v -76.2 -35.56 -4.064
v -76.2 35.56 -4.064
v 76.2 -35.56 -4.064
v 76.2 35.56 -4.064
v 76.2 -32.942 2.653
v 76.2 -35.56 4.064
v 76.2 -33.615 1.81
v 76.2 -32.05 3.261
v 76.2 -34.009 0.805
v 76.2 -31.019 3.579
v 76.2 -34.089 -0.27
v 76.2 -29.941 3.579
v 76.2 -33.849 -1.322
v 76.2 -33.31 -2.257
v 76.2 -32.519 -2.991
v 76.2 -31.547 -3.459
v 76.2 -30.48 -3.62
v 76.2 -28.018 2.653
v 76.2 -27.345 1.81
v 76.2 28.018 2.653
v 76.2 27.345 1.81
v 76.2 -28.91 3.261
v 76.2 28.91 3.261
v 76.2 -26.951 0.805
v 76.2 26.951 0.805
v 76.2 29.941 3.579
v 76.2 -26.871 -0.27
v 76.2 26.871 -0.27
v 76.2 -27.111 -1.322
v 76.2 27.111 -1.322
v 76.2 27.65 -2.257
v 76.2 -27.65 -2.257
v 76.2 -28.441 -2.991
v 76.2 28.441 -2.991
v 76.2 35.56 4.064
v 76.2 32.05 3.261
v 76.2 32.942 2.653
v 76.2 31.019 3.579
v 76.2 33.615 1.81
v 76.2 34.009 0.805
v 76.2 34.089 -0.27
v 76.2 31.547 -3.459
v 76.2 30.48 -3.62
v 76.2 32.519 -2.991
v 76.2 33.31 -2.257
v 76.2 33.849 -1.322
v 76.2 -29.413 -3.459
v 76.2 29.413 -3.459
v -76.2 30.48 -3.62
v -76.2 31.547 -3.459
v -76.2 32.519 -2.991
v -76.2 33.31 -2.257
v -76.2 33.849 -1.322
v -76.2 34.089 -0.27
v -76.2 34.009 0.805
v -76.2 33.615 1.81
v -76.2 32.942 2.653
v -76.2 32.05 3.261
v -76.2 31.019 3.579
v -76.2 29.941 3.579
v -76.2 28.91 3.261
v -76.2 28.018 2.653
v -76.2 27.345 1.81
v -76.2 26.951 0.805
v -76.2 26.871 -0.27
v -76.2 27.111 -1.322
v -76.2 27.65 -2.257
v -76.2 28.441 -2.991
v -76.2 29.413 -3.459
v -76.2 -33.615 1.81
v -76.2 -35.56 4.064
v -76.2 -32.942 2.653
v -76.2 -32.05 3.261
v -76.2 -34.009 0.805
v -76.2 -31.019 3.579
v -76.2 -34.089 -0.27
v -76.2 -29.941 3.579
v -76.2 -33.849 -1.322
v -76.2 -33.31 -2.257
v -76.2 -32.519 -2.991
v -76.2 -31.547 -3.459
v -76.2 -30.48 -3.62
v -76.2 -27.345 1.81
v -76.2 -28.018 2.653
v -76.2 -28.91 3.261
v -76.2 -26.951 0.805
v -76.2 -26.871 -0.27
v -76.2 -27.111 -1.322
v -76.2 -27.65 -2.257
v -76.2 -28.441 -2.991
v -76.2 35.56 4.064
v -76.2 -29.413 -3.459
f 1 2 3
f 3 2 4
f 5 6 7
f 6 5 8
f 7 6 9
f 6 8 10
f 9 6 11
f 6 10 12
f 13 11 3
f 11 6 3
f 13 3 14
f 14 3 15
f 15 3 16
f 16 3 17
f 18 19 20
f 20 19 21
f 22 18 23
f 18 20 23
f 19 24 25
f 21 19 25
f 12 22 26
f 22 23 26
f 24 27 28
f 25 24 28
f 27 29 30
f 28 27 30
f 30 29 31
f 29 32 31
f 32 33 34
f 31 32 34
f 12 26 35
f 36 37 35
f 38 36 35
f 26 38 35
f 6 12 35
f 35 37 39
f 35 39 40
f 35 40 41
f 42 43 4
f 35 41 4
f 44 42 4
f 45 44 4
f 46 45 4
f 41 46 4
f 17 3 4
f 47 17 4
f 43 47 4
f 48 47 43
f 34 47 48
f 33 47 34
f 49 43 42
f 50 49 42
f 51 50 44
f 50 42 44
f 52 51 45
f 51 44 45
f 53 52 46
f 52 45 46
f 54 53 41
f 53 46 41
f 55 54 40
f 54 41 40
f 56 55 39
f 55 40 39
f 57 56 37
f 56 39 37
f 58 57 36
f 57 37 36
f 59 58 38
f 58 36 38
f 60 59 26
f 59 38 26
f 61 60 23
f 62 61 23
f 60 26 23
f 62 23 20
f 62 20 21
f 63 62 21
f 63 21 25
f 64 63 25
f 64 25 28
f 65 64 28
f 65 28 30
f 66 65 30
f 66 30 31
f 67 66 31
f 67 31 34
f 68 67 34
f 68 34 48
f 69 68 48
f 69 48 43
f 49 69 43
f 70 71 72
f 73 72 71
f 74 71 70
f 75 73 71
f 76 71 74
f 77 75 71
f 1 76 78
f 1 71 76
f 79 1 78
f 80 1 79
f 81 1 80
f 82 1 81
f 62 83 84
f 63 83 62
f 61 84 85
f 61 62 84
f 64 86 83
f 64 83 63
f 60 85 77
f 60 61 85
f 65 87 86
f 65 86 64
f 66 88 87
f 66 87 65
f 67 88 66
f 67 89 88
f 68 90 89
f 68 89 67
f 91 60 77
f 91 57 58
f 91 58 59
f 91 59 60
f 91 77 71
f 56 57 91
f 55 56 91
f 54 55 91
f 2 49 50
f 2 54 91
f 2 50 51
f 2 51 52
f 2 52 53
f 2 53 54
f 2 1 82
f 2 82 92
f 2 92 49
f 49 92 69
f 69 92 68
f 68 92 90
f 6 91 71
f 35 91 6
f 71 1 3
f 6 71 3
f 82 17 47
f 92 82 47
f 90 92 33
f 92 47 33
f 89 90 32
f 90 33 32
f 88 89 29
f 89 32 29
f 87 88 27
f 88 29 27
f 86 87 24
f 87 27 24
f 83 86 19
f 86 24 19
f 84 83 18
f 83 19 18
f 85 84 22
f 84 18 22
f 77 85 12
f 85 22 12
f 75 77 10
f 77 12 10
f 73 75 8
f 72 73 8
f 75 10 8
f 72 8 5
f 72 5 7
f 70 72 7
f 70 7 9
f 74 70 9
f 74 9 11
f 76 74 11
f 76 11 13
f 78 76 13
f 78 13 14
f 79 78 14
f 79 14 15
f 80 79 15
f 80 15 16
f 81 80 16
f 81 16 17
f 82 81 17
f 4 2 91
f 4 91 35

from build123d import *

# Parameters (mm, degrees)
BOSS_EXTRUDE1_DEPTH      = 4.064
BOSS_EXTRUDE1_DEPTH_BACK = 4.064
BOARD_W                  = 152.4
BOARD_H                  = 71.12
SKETCH2_R                = 3.6195
CUT_EXTRUDE1_DEPTH       = 157.546445811


with BuildPart() as part:
    # board → Boss-Extrude1 (new, two sides: drawn at the far end of the back side and taken through both)
    with BuildSketch(Plane.XY.offset(-BOSS_EXTRUDE1_DEPTH_BACK)):
        Rectangle(BOARD_W, BOARD_H)
    extrude(amount=BOSS_EXTRUDE1_DEPTH + BOSS_EXTRUDE1_DEPTH_BACK)

    # Sketch2 → Cut-Extrude1 (cut, through all)
    with BuildSketch(Plane(origin=(76.2, 0, 0), x_dir=(0, 0, -1), z_dir=(1, 0, 0))):
        with Locations((0, 30.48)):
            Circle(SKETCH2_R)
        with Locations((0, -30.48)):
            Circle(SKETCH2_R)
    extrude(amount=-CUT_EXTRUDE1_DEPTH, mode=Mode.SUBTRACT)


solid = part.part
